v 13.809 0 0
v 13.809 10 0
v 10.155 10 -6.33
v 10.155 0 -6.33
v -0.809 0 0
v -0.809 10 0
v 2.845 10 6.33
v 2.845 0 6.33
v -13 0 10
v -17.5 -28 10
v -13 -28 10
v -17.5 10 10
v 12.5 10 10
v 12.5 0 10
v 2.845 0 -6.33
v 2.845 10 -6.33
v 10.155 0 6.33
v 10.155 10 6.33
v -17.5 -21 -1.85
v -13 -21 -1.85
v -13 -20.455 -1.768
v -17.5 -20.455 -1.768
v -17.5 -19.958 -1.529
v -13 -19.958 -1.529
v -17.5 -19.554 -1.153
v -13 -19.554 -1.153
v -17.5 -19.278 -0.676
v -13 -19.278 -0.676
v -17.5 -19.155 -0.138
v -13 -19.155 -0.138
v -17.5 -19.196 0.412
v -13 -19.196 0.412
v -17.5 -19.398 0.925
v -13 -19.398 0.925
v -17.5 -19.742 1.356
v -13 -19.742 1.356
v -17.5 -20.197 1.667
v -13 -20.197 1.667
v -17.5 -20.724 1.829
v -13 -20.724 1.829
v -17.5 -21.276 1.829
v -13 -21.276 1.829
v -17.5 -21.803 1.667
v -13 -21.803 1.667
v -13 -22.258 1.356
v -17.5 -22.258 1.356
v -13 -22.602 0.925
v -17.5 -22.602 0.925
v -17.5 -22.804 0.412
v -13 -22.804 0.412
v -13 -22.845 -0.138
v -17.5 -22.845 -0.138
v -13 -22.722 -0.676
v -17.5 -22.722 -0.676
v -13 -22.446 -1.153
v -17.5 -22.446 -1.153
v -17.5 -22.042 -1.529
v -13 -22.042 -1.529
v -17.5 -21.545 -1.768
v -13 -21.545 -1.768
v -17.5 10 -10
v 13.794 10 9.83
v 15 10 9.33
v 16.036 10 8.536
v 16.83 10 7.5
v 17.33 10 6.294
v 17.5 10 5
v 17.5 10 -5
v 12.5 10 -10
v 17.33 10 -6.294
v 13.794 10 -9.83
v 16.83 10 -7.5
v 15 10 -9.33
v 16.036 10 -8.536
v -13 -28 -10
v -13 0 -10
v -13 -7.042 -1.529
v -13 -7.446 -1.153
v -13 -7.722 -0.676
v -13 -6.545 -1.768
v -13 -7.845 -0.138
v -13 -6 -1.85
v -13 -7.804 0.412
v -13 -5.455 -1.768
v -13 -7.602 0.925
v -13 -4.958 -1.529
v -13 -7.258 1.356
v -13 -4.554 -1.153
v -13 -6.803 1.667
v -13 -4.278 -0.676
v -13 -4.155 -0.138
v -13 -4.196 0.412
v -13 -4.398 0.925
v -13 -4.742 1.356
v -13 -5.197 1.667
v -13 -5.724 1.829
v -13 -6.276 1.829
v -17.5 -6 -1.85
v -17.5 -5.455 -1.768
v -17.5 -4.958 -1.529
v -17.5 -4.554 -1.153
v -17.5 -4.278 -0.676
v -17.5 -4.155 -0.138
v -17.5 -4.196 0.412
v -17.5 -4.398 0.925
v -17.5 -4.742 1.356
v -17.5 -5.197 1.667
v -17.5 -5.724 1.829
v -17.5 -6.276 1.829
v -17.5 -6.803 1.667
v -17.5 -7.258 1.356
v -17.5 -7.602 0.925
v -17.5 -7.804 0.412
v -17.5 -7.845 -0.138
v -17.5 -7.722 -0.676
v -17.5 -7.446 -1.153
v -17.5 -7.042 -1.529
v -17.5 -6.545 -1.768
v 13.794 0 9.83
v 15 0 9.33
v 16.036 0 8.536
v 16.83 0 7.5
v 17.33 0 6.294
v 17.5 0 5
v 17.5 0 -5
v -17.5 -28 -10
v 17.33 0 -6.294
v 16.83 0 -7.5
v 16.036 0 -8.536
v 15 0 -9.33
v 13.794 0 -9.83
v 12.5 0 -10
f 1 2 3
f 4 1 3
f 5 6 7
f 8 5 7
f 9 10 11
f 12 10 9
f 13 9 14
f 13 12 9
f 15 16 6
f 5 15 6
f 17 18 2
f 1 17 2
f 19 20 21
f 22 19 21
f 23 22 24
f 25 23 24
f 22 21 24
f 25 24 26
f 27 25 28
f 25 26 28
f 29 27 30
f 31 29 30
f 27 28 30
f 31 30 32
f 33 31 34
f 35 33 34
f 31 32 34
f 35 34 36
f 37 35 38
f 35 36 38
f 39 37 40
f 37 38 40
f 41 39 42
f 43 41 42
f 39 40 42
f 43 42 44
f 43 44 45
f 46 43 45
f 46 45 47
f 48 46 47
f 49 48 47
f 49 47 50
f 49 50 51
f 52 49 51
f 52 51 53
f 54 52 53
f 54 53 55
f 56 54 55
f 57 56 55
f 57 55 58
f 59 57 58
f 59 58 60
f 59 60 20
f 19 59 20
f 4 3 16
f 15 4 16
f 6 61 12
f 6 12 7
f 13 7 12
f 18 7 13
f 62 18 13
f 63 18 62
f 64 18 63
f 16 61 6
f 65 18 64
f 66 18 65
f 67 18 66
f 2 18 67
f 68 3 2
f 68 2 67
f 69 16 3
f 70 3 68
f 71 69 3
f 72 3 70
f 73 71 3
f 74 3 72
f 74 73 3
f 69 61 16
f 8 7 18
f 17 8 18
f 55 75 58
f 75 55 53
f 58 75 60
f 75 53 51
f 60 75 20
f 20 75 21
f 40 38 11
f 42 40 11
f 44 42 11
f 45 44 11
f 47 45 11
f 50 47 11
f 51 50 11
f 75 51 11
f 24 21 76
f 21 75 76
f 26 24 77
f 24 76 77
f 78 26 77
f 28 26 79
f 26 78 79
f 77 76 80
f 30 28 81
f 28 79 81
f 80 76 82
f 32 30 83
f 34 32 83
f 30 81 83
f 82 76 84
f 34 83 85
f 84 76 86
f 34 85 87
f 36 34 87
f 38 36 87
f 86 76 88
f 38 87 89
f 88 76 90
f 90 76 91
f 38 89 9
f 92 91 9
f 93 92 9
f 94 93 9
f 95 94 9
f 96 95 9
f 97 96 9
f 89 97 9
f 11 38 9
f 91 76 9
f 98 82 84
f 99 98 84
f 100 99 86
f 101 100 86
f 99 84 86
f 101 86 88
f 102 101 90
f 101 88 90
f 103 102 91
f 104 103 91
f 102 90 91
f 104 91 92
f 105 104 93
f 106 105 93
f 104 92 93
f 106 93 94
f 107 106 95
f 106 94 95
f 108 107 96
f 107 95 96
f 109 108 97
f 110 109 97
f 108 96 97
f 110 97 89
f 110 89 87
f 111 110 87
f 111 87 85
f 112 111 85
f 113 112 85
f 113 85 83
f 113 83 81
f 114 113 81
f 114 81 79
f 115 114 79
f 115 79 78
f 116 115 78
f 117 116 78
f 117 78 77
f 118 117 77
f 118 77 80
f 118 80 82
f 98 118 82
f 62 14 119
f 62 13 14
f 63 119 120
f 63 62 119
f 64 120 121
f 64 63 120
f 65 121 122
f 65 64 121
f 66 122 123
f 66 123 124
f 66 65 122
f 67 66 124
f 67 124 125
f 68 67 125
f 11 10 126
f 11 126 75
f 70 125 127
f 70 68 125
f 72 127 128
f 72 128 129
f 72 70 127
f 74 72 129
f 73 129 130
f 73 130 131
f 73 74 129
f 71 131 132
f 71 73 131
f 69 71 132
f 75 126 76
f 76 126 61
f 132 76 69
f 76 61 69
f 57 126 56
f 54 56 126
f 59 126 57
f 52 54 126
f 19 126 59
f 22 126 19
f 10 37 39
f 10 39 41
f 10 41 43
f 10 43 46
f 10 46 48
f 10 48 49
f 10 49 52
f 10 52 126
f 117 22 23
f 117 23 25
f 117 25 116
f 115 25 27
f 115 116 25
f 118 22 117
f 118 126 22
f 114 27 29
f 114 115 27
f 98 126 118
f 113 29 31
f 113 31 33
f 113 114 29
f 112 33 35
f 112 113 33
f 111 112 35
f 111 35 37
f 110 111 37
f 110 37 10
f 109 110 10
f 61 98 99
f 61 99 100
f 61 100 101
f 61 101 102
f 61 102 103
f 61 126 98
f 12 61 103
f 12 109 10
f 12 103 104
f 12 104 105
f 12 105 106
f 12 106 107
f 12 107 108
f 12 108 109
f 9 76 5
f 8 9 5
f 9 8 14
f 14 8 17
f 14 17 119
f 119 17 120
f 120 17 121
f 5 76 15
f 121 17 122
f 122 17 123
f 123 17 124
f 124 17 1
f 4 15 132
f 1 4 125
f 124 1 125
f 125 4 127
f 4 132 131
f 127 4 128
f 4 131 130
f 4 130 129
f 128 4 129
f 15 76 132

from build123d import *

# Parameters (mm, degrees)
SKETCH1_W           = 35
SKETCH1_H           = 20
BOSS_EXTRUDE1_DEPTH = 10
FILLET1_R           = 5
CUT_EXTRUDE2_DEPTH  = 23.5
SKETCH5_W           = 4.5
SKETCH5_H           = 20
BOSS_EXTRUDE3_DEPTH = 28
SKETCH6_R           = 1.85
CUT_EXTRUDE3_DEPTH  = 43.594013664


with BuildPart() as part:
    # Sketch1 → Boss-Extrude1 (new body)
    with BuildSketch(Plane(origin=(0, 0, 0), x_dir=(1, 0, 0), z_dir=(0, 1, 0))):
        Rectangle(SKETCH1_W, SKETCH1_H)
    extrude(amount=BOSS_EXTRUDE1_DEPTH)

    # Fillet1
    fillet1_edges = [part.edges().sort_by_distance(p)[0] for p in [
        (17.5, 5, 10),
        (17.5, 5, -10),
    ]]
    fillet(fillet1_edges, radius=FILLET1_R)

    # Sketch4 → Cut-Extrude2 (cut, through all)
    with BuildSketch(Plane(origin=(0, 10, 0), x_dir=(1, 0, 0), z_dir=(0, 1, 0))):
        Polygon((10.154627204, -6.33), (13.809254408, 0), (10.154627204, 6.33), (2.845372796, 6.33), (-0.809254408, 0), (2.845372796, -6.33), align=None)
    extrude(amount=-CUT_EXTRUDE2_DEPTH, mode=Mode.SUBTRACT)

    # Sketch5 → Boss-Extrude3 (add)
    with BuildSketch(Plane.XZ):
        with Locations((-15.25, 0)):
            Rectangle(SKETCH5_W, SKETCH5_H)
    extrude(amount=BOSS_EXTRUDE3_DEPTH)

    # Sketch6 → Cut-Extrude3 (cut, through all)
    with BuildSketch(Plane(origin=(-13, 0, 0), x_dir=(0, 0, -1), z_dir=(1, 0, 0))):
        with Locations((0, -6)):
            Circle(SKETCH6_R)
        with Locations((0, -21)):
            Circle(SKETCH6_R)
    extrude(amount=-CUT_EXTRUDE3_DEPTH, mode=Mode.SUBTRACT)


solid = part.part
